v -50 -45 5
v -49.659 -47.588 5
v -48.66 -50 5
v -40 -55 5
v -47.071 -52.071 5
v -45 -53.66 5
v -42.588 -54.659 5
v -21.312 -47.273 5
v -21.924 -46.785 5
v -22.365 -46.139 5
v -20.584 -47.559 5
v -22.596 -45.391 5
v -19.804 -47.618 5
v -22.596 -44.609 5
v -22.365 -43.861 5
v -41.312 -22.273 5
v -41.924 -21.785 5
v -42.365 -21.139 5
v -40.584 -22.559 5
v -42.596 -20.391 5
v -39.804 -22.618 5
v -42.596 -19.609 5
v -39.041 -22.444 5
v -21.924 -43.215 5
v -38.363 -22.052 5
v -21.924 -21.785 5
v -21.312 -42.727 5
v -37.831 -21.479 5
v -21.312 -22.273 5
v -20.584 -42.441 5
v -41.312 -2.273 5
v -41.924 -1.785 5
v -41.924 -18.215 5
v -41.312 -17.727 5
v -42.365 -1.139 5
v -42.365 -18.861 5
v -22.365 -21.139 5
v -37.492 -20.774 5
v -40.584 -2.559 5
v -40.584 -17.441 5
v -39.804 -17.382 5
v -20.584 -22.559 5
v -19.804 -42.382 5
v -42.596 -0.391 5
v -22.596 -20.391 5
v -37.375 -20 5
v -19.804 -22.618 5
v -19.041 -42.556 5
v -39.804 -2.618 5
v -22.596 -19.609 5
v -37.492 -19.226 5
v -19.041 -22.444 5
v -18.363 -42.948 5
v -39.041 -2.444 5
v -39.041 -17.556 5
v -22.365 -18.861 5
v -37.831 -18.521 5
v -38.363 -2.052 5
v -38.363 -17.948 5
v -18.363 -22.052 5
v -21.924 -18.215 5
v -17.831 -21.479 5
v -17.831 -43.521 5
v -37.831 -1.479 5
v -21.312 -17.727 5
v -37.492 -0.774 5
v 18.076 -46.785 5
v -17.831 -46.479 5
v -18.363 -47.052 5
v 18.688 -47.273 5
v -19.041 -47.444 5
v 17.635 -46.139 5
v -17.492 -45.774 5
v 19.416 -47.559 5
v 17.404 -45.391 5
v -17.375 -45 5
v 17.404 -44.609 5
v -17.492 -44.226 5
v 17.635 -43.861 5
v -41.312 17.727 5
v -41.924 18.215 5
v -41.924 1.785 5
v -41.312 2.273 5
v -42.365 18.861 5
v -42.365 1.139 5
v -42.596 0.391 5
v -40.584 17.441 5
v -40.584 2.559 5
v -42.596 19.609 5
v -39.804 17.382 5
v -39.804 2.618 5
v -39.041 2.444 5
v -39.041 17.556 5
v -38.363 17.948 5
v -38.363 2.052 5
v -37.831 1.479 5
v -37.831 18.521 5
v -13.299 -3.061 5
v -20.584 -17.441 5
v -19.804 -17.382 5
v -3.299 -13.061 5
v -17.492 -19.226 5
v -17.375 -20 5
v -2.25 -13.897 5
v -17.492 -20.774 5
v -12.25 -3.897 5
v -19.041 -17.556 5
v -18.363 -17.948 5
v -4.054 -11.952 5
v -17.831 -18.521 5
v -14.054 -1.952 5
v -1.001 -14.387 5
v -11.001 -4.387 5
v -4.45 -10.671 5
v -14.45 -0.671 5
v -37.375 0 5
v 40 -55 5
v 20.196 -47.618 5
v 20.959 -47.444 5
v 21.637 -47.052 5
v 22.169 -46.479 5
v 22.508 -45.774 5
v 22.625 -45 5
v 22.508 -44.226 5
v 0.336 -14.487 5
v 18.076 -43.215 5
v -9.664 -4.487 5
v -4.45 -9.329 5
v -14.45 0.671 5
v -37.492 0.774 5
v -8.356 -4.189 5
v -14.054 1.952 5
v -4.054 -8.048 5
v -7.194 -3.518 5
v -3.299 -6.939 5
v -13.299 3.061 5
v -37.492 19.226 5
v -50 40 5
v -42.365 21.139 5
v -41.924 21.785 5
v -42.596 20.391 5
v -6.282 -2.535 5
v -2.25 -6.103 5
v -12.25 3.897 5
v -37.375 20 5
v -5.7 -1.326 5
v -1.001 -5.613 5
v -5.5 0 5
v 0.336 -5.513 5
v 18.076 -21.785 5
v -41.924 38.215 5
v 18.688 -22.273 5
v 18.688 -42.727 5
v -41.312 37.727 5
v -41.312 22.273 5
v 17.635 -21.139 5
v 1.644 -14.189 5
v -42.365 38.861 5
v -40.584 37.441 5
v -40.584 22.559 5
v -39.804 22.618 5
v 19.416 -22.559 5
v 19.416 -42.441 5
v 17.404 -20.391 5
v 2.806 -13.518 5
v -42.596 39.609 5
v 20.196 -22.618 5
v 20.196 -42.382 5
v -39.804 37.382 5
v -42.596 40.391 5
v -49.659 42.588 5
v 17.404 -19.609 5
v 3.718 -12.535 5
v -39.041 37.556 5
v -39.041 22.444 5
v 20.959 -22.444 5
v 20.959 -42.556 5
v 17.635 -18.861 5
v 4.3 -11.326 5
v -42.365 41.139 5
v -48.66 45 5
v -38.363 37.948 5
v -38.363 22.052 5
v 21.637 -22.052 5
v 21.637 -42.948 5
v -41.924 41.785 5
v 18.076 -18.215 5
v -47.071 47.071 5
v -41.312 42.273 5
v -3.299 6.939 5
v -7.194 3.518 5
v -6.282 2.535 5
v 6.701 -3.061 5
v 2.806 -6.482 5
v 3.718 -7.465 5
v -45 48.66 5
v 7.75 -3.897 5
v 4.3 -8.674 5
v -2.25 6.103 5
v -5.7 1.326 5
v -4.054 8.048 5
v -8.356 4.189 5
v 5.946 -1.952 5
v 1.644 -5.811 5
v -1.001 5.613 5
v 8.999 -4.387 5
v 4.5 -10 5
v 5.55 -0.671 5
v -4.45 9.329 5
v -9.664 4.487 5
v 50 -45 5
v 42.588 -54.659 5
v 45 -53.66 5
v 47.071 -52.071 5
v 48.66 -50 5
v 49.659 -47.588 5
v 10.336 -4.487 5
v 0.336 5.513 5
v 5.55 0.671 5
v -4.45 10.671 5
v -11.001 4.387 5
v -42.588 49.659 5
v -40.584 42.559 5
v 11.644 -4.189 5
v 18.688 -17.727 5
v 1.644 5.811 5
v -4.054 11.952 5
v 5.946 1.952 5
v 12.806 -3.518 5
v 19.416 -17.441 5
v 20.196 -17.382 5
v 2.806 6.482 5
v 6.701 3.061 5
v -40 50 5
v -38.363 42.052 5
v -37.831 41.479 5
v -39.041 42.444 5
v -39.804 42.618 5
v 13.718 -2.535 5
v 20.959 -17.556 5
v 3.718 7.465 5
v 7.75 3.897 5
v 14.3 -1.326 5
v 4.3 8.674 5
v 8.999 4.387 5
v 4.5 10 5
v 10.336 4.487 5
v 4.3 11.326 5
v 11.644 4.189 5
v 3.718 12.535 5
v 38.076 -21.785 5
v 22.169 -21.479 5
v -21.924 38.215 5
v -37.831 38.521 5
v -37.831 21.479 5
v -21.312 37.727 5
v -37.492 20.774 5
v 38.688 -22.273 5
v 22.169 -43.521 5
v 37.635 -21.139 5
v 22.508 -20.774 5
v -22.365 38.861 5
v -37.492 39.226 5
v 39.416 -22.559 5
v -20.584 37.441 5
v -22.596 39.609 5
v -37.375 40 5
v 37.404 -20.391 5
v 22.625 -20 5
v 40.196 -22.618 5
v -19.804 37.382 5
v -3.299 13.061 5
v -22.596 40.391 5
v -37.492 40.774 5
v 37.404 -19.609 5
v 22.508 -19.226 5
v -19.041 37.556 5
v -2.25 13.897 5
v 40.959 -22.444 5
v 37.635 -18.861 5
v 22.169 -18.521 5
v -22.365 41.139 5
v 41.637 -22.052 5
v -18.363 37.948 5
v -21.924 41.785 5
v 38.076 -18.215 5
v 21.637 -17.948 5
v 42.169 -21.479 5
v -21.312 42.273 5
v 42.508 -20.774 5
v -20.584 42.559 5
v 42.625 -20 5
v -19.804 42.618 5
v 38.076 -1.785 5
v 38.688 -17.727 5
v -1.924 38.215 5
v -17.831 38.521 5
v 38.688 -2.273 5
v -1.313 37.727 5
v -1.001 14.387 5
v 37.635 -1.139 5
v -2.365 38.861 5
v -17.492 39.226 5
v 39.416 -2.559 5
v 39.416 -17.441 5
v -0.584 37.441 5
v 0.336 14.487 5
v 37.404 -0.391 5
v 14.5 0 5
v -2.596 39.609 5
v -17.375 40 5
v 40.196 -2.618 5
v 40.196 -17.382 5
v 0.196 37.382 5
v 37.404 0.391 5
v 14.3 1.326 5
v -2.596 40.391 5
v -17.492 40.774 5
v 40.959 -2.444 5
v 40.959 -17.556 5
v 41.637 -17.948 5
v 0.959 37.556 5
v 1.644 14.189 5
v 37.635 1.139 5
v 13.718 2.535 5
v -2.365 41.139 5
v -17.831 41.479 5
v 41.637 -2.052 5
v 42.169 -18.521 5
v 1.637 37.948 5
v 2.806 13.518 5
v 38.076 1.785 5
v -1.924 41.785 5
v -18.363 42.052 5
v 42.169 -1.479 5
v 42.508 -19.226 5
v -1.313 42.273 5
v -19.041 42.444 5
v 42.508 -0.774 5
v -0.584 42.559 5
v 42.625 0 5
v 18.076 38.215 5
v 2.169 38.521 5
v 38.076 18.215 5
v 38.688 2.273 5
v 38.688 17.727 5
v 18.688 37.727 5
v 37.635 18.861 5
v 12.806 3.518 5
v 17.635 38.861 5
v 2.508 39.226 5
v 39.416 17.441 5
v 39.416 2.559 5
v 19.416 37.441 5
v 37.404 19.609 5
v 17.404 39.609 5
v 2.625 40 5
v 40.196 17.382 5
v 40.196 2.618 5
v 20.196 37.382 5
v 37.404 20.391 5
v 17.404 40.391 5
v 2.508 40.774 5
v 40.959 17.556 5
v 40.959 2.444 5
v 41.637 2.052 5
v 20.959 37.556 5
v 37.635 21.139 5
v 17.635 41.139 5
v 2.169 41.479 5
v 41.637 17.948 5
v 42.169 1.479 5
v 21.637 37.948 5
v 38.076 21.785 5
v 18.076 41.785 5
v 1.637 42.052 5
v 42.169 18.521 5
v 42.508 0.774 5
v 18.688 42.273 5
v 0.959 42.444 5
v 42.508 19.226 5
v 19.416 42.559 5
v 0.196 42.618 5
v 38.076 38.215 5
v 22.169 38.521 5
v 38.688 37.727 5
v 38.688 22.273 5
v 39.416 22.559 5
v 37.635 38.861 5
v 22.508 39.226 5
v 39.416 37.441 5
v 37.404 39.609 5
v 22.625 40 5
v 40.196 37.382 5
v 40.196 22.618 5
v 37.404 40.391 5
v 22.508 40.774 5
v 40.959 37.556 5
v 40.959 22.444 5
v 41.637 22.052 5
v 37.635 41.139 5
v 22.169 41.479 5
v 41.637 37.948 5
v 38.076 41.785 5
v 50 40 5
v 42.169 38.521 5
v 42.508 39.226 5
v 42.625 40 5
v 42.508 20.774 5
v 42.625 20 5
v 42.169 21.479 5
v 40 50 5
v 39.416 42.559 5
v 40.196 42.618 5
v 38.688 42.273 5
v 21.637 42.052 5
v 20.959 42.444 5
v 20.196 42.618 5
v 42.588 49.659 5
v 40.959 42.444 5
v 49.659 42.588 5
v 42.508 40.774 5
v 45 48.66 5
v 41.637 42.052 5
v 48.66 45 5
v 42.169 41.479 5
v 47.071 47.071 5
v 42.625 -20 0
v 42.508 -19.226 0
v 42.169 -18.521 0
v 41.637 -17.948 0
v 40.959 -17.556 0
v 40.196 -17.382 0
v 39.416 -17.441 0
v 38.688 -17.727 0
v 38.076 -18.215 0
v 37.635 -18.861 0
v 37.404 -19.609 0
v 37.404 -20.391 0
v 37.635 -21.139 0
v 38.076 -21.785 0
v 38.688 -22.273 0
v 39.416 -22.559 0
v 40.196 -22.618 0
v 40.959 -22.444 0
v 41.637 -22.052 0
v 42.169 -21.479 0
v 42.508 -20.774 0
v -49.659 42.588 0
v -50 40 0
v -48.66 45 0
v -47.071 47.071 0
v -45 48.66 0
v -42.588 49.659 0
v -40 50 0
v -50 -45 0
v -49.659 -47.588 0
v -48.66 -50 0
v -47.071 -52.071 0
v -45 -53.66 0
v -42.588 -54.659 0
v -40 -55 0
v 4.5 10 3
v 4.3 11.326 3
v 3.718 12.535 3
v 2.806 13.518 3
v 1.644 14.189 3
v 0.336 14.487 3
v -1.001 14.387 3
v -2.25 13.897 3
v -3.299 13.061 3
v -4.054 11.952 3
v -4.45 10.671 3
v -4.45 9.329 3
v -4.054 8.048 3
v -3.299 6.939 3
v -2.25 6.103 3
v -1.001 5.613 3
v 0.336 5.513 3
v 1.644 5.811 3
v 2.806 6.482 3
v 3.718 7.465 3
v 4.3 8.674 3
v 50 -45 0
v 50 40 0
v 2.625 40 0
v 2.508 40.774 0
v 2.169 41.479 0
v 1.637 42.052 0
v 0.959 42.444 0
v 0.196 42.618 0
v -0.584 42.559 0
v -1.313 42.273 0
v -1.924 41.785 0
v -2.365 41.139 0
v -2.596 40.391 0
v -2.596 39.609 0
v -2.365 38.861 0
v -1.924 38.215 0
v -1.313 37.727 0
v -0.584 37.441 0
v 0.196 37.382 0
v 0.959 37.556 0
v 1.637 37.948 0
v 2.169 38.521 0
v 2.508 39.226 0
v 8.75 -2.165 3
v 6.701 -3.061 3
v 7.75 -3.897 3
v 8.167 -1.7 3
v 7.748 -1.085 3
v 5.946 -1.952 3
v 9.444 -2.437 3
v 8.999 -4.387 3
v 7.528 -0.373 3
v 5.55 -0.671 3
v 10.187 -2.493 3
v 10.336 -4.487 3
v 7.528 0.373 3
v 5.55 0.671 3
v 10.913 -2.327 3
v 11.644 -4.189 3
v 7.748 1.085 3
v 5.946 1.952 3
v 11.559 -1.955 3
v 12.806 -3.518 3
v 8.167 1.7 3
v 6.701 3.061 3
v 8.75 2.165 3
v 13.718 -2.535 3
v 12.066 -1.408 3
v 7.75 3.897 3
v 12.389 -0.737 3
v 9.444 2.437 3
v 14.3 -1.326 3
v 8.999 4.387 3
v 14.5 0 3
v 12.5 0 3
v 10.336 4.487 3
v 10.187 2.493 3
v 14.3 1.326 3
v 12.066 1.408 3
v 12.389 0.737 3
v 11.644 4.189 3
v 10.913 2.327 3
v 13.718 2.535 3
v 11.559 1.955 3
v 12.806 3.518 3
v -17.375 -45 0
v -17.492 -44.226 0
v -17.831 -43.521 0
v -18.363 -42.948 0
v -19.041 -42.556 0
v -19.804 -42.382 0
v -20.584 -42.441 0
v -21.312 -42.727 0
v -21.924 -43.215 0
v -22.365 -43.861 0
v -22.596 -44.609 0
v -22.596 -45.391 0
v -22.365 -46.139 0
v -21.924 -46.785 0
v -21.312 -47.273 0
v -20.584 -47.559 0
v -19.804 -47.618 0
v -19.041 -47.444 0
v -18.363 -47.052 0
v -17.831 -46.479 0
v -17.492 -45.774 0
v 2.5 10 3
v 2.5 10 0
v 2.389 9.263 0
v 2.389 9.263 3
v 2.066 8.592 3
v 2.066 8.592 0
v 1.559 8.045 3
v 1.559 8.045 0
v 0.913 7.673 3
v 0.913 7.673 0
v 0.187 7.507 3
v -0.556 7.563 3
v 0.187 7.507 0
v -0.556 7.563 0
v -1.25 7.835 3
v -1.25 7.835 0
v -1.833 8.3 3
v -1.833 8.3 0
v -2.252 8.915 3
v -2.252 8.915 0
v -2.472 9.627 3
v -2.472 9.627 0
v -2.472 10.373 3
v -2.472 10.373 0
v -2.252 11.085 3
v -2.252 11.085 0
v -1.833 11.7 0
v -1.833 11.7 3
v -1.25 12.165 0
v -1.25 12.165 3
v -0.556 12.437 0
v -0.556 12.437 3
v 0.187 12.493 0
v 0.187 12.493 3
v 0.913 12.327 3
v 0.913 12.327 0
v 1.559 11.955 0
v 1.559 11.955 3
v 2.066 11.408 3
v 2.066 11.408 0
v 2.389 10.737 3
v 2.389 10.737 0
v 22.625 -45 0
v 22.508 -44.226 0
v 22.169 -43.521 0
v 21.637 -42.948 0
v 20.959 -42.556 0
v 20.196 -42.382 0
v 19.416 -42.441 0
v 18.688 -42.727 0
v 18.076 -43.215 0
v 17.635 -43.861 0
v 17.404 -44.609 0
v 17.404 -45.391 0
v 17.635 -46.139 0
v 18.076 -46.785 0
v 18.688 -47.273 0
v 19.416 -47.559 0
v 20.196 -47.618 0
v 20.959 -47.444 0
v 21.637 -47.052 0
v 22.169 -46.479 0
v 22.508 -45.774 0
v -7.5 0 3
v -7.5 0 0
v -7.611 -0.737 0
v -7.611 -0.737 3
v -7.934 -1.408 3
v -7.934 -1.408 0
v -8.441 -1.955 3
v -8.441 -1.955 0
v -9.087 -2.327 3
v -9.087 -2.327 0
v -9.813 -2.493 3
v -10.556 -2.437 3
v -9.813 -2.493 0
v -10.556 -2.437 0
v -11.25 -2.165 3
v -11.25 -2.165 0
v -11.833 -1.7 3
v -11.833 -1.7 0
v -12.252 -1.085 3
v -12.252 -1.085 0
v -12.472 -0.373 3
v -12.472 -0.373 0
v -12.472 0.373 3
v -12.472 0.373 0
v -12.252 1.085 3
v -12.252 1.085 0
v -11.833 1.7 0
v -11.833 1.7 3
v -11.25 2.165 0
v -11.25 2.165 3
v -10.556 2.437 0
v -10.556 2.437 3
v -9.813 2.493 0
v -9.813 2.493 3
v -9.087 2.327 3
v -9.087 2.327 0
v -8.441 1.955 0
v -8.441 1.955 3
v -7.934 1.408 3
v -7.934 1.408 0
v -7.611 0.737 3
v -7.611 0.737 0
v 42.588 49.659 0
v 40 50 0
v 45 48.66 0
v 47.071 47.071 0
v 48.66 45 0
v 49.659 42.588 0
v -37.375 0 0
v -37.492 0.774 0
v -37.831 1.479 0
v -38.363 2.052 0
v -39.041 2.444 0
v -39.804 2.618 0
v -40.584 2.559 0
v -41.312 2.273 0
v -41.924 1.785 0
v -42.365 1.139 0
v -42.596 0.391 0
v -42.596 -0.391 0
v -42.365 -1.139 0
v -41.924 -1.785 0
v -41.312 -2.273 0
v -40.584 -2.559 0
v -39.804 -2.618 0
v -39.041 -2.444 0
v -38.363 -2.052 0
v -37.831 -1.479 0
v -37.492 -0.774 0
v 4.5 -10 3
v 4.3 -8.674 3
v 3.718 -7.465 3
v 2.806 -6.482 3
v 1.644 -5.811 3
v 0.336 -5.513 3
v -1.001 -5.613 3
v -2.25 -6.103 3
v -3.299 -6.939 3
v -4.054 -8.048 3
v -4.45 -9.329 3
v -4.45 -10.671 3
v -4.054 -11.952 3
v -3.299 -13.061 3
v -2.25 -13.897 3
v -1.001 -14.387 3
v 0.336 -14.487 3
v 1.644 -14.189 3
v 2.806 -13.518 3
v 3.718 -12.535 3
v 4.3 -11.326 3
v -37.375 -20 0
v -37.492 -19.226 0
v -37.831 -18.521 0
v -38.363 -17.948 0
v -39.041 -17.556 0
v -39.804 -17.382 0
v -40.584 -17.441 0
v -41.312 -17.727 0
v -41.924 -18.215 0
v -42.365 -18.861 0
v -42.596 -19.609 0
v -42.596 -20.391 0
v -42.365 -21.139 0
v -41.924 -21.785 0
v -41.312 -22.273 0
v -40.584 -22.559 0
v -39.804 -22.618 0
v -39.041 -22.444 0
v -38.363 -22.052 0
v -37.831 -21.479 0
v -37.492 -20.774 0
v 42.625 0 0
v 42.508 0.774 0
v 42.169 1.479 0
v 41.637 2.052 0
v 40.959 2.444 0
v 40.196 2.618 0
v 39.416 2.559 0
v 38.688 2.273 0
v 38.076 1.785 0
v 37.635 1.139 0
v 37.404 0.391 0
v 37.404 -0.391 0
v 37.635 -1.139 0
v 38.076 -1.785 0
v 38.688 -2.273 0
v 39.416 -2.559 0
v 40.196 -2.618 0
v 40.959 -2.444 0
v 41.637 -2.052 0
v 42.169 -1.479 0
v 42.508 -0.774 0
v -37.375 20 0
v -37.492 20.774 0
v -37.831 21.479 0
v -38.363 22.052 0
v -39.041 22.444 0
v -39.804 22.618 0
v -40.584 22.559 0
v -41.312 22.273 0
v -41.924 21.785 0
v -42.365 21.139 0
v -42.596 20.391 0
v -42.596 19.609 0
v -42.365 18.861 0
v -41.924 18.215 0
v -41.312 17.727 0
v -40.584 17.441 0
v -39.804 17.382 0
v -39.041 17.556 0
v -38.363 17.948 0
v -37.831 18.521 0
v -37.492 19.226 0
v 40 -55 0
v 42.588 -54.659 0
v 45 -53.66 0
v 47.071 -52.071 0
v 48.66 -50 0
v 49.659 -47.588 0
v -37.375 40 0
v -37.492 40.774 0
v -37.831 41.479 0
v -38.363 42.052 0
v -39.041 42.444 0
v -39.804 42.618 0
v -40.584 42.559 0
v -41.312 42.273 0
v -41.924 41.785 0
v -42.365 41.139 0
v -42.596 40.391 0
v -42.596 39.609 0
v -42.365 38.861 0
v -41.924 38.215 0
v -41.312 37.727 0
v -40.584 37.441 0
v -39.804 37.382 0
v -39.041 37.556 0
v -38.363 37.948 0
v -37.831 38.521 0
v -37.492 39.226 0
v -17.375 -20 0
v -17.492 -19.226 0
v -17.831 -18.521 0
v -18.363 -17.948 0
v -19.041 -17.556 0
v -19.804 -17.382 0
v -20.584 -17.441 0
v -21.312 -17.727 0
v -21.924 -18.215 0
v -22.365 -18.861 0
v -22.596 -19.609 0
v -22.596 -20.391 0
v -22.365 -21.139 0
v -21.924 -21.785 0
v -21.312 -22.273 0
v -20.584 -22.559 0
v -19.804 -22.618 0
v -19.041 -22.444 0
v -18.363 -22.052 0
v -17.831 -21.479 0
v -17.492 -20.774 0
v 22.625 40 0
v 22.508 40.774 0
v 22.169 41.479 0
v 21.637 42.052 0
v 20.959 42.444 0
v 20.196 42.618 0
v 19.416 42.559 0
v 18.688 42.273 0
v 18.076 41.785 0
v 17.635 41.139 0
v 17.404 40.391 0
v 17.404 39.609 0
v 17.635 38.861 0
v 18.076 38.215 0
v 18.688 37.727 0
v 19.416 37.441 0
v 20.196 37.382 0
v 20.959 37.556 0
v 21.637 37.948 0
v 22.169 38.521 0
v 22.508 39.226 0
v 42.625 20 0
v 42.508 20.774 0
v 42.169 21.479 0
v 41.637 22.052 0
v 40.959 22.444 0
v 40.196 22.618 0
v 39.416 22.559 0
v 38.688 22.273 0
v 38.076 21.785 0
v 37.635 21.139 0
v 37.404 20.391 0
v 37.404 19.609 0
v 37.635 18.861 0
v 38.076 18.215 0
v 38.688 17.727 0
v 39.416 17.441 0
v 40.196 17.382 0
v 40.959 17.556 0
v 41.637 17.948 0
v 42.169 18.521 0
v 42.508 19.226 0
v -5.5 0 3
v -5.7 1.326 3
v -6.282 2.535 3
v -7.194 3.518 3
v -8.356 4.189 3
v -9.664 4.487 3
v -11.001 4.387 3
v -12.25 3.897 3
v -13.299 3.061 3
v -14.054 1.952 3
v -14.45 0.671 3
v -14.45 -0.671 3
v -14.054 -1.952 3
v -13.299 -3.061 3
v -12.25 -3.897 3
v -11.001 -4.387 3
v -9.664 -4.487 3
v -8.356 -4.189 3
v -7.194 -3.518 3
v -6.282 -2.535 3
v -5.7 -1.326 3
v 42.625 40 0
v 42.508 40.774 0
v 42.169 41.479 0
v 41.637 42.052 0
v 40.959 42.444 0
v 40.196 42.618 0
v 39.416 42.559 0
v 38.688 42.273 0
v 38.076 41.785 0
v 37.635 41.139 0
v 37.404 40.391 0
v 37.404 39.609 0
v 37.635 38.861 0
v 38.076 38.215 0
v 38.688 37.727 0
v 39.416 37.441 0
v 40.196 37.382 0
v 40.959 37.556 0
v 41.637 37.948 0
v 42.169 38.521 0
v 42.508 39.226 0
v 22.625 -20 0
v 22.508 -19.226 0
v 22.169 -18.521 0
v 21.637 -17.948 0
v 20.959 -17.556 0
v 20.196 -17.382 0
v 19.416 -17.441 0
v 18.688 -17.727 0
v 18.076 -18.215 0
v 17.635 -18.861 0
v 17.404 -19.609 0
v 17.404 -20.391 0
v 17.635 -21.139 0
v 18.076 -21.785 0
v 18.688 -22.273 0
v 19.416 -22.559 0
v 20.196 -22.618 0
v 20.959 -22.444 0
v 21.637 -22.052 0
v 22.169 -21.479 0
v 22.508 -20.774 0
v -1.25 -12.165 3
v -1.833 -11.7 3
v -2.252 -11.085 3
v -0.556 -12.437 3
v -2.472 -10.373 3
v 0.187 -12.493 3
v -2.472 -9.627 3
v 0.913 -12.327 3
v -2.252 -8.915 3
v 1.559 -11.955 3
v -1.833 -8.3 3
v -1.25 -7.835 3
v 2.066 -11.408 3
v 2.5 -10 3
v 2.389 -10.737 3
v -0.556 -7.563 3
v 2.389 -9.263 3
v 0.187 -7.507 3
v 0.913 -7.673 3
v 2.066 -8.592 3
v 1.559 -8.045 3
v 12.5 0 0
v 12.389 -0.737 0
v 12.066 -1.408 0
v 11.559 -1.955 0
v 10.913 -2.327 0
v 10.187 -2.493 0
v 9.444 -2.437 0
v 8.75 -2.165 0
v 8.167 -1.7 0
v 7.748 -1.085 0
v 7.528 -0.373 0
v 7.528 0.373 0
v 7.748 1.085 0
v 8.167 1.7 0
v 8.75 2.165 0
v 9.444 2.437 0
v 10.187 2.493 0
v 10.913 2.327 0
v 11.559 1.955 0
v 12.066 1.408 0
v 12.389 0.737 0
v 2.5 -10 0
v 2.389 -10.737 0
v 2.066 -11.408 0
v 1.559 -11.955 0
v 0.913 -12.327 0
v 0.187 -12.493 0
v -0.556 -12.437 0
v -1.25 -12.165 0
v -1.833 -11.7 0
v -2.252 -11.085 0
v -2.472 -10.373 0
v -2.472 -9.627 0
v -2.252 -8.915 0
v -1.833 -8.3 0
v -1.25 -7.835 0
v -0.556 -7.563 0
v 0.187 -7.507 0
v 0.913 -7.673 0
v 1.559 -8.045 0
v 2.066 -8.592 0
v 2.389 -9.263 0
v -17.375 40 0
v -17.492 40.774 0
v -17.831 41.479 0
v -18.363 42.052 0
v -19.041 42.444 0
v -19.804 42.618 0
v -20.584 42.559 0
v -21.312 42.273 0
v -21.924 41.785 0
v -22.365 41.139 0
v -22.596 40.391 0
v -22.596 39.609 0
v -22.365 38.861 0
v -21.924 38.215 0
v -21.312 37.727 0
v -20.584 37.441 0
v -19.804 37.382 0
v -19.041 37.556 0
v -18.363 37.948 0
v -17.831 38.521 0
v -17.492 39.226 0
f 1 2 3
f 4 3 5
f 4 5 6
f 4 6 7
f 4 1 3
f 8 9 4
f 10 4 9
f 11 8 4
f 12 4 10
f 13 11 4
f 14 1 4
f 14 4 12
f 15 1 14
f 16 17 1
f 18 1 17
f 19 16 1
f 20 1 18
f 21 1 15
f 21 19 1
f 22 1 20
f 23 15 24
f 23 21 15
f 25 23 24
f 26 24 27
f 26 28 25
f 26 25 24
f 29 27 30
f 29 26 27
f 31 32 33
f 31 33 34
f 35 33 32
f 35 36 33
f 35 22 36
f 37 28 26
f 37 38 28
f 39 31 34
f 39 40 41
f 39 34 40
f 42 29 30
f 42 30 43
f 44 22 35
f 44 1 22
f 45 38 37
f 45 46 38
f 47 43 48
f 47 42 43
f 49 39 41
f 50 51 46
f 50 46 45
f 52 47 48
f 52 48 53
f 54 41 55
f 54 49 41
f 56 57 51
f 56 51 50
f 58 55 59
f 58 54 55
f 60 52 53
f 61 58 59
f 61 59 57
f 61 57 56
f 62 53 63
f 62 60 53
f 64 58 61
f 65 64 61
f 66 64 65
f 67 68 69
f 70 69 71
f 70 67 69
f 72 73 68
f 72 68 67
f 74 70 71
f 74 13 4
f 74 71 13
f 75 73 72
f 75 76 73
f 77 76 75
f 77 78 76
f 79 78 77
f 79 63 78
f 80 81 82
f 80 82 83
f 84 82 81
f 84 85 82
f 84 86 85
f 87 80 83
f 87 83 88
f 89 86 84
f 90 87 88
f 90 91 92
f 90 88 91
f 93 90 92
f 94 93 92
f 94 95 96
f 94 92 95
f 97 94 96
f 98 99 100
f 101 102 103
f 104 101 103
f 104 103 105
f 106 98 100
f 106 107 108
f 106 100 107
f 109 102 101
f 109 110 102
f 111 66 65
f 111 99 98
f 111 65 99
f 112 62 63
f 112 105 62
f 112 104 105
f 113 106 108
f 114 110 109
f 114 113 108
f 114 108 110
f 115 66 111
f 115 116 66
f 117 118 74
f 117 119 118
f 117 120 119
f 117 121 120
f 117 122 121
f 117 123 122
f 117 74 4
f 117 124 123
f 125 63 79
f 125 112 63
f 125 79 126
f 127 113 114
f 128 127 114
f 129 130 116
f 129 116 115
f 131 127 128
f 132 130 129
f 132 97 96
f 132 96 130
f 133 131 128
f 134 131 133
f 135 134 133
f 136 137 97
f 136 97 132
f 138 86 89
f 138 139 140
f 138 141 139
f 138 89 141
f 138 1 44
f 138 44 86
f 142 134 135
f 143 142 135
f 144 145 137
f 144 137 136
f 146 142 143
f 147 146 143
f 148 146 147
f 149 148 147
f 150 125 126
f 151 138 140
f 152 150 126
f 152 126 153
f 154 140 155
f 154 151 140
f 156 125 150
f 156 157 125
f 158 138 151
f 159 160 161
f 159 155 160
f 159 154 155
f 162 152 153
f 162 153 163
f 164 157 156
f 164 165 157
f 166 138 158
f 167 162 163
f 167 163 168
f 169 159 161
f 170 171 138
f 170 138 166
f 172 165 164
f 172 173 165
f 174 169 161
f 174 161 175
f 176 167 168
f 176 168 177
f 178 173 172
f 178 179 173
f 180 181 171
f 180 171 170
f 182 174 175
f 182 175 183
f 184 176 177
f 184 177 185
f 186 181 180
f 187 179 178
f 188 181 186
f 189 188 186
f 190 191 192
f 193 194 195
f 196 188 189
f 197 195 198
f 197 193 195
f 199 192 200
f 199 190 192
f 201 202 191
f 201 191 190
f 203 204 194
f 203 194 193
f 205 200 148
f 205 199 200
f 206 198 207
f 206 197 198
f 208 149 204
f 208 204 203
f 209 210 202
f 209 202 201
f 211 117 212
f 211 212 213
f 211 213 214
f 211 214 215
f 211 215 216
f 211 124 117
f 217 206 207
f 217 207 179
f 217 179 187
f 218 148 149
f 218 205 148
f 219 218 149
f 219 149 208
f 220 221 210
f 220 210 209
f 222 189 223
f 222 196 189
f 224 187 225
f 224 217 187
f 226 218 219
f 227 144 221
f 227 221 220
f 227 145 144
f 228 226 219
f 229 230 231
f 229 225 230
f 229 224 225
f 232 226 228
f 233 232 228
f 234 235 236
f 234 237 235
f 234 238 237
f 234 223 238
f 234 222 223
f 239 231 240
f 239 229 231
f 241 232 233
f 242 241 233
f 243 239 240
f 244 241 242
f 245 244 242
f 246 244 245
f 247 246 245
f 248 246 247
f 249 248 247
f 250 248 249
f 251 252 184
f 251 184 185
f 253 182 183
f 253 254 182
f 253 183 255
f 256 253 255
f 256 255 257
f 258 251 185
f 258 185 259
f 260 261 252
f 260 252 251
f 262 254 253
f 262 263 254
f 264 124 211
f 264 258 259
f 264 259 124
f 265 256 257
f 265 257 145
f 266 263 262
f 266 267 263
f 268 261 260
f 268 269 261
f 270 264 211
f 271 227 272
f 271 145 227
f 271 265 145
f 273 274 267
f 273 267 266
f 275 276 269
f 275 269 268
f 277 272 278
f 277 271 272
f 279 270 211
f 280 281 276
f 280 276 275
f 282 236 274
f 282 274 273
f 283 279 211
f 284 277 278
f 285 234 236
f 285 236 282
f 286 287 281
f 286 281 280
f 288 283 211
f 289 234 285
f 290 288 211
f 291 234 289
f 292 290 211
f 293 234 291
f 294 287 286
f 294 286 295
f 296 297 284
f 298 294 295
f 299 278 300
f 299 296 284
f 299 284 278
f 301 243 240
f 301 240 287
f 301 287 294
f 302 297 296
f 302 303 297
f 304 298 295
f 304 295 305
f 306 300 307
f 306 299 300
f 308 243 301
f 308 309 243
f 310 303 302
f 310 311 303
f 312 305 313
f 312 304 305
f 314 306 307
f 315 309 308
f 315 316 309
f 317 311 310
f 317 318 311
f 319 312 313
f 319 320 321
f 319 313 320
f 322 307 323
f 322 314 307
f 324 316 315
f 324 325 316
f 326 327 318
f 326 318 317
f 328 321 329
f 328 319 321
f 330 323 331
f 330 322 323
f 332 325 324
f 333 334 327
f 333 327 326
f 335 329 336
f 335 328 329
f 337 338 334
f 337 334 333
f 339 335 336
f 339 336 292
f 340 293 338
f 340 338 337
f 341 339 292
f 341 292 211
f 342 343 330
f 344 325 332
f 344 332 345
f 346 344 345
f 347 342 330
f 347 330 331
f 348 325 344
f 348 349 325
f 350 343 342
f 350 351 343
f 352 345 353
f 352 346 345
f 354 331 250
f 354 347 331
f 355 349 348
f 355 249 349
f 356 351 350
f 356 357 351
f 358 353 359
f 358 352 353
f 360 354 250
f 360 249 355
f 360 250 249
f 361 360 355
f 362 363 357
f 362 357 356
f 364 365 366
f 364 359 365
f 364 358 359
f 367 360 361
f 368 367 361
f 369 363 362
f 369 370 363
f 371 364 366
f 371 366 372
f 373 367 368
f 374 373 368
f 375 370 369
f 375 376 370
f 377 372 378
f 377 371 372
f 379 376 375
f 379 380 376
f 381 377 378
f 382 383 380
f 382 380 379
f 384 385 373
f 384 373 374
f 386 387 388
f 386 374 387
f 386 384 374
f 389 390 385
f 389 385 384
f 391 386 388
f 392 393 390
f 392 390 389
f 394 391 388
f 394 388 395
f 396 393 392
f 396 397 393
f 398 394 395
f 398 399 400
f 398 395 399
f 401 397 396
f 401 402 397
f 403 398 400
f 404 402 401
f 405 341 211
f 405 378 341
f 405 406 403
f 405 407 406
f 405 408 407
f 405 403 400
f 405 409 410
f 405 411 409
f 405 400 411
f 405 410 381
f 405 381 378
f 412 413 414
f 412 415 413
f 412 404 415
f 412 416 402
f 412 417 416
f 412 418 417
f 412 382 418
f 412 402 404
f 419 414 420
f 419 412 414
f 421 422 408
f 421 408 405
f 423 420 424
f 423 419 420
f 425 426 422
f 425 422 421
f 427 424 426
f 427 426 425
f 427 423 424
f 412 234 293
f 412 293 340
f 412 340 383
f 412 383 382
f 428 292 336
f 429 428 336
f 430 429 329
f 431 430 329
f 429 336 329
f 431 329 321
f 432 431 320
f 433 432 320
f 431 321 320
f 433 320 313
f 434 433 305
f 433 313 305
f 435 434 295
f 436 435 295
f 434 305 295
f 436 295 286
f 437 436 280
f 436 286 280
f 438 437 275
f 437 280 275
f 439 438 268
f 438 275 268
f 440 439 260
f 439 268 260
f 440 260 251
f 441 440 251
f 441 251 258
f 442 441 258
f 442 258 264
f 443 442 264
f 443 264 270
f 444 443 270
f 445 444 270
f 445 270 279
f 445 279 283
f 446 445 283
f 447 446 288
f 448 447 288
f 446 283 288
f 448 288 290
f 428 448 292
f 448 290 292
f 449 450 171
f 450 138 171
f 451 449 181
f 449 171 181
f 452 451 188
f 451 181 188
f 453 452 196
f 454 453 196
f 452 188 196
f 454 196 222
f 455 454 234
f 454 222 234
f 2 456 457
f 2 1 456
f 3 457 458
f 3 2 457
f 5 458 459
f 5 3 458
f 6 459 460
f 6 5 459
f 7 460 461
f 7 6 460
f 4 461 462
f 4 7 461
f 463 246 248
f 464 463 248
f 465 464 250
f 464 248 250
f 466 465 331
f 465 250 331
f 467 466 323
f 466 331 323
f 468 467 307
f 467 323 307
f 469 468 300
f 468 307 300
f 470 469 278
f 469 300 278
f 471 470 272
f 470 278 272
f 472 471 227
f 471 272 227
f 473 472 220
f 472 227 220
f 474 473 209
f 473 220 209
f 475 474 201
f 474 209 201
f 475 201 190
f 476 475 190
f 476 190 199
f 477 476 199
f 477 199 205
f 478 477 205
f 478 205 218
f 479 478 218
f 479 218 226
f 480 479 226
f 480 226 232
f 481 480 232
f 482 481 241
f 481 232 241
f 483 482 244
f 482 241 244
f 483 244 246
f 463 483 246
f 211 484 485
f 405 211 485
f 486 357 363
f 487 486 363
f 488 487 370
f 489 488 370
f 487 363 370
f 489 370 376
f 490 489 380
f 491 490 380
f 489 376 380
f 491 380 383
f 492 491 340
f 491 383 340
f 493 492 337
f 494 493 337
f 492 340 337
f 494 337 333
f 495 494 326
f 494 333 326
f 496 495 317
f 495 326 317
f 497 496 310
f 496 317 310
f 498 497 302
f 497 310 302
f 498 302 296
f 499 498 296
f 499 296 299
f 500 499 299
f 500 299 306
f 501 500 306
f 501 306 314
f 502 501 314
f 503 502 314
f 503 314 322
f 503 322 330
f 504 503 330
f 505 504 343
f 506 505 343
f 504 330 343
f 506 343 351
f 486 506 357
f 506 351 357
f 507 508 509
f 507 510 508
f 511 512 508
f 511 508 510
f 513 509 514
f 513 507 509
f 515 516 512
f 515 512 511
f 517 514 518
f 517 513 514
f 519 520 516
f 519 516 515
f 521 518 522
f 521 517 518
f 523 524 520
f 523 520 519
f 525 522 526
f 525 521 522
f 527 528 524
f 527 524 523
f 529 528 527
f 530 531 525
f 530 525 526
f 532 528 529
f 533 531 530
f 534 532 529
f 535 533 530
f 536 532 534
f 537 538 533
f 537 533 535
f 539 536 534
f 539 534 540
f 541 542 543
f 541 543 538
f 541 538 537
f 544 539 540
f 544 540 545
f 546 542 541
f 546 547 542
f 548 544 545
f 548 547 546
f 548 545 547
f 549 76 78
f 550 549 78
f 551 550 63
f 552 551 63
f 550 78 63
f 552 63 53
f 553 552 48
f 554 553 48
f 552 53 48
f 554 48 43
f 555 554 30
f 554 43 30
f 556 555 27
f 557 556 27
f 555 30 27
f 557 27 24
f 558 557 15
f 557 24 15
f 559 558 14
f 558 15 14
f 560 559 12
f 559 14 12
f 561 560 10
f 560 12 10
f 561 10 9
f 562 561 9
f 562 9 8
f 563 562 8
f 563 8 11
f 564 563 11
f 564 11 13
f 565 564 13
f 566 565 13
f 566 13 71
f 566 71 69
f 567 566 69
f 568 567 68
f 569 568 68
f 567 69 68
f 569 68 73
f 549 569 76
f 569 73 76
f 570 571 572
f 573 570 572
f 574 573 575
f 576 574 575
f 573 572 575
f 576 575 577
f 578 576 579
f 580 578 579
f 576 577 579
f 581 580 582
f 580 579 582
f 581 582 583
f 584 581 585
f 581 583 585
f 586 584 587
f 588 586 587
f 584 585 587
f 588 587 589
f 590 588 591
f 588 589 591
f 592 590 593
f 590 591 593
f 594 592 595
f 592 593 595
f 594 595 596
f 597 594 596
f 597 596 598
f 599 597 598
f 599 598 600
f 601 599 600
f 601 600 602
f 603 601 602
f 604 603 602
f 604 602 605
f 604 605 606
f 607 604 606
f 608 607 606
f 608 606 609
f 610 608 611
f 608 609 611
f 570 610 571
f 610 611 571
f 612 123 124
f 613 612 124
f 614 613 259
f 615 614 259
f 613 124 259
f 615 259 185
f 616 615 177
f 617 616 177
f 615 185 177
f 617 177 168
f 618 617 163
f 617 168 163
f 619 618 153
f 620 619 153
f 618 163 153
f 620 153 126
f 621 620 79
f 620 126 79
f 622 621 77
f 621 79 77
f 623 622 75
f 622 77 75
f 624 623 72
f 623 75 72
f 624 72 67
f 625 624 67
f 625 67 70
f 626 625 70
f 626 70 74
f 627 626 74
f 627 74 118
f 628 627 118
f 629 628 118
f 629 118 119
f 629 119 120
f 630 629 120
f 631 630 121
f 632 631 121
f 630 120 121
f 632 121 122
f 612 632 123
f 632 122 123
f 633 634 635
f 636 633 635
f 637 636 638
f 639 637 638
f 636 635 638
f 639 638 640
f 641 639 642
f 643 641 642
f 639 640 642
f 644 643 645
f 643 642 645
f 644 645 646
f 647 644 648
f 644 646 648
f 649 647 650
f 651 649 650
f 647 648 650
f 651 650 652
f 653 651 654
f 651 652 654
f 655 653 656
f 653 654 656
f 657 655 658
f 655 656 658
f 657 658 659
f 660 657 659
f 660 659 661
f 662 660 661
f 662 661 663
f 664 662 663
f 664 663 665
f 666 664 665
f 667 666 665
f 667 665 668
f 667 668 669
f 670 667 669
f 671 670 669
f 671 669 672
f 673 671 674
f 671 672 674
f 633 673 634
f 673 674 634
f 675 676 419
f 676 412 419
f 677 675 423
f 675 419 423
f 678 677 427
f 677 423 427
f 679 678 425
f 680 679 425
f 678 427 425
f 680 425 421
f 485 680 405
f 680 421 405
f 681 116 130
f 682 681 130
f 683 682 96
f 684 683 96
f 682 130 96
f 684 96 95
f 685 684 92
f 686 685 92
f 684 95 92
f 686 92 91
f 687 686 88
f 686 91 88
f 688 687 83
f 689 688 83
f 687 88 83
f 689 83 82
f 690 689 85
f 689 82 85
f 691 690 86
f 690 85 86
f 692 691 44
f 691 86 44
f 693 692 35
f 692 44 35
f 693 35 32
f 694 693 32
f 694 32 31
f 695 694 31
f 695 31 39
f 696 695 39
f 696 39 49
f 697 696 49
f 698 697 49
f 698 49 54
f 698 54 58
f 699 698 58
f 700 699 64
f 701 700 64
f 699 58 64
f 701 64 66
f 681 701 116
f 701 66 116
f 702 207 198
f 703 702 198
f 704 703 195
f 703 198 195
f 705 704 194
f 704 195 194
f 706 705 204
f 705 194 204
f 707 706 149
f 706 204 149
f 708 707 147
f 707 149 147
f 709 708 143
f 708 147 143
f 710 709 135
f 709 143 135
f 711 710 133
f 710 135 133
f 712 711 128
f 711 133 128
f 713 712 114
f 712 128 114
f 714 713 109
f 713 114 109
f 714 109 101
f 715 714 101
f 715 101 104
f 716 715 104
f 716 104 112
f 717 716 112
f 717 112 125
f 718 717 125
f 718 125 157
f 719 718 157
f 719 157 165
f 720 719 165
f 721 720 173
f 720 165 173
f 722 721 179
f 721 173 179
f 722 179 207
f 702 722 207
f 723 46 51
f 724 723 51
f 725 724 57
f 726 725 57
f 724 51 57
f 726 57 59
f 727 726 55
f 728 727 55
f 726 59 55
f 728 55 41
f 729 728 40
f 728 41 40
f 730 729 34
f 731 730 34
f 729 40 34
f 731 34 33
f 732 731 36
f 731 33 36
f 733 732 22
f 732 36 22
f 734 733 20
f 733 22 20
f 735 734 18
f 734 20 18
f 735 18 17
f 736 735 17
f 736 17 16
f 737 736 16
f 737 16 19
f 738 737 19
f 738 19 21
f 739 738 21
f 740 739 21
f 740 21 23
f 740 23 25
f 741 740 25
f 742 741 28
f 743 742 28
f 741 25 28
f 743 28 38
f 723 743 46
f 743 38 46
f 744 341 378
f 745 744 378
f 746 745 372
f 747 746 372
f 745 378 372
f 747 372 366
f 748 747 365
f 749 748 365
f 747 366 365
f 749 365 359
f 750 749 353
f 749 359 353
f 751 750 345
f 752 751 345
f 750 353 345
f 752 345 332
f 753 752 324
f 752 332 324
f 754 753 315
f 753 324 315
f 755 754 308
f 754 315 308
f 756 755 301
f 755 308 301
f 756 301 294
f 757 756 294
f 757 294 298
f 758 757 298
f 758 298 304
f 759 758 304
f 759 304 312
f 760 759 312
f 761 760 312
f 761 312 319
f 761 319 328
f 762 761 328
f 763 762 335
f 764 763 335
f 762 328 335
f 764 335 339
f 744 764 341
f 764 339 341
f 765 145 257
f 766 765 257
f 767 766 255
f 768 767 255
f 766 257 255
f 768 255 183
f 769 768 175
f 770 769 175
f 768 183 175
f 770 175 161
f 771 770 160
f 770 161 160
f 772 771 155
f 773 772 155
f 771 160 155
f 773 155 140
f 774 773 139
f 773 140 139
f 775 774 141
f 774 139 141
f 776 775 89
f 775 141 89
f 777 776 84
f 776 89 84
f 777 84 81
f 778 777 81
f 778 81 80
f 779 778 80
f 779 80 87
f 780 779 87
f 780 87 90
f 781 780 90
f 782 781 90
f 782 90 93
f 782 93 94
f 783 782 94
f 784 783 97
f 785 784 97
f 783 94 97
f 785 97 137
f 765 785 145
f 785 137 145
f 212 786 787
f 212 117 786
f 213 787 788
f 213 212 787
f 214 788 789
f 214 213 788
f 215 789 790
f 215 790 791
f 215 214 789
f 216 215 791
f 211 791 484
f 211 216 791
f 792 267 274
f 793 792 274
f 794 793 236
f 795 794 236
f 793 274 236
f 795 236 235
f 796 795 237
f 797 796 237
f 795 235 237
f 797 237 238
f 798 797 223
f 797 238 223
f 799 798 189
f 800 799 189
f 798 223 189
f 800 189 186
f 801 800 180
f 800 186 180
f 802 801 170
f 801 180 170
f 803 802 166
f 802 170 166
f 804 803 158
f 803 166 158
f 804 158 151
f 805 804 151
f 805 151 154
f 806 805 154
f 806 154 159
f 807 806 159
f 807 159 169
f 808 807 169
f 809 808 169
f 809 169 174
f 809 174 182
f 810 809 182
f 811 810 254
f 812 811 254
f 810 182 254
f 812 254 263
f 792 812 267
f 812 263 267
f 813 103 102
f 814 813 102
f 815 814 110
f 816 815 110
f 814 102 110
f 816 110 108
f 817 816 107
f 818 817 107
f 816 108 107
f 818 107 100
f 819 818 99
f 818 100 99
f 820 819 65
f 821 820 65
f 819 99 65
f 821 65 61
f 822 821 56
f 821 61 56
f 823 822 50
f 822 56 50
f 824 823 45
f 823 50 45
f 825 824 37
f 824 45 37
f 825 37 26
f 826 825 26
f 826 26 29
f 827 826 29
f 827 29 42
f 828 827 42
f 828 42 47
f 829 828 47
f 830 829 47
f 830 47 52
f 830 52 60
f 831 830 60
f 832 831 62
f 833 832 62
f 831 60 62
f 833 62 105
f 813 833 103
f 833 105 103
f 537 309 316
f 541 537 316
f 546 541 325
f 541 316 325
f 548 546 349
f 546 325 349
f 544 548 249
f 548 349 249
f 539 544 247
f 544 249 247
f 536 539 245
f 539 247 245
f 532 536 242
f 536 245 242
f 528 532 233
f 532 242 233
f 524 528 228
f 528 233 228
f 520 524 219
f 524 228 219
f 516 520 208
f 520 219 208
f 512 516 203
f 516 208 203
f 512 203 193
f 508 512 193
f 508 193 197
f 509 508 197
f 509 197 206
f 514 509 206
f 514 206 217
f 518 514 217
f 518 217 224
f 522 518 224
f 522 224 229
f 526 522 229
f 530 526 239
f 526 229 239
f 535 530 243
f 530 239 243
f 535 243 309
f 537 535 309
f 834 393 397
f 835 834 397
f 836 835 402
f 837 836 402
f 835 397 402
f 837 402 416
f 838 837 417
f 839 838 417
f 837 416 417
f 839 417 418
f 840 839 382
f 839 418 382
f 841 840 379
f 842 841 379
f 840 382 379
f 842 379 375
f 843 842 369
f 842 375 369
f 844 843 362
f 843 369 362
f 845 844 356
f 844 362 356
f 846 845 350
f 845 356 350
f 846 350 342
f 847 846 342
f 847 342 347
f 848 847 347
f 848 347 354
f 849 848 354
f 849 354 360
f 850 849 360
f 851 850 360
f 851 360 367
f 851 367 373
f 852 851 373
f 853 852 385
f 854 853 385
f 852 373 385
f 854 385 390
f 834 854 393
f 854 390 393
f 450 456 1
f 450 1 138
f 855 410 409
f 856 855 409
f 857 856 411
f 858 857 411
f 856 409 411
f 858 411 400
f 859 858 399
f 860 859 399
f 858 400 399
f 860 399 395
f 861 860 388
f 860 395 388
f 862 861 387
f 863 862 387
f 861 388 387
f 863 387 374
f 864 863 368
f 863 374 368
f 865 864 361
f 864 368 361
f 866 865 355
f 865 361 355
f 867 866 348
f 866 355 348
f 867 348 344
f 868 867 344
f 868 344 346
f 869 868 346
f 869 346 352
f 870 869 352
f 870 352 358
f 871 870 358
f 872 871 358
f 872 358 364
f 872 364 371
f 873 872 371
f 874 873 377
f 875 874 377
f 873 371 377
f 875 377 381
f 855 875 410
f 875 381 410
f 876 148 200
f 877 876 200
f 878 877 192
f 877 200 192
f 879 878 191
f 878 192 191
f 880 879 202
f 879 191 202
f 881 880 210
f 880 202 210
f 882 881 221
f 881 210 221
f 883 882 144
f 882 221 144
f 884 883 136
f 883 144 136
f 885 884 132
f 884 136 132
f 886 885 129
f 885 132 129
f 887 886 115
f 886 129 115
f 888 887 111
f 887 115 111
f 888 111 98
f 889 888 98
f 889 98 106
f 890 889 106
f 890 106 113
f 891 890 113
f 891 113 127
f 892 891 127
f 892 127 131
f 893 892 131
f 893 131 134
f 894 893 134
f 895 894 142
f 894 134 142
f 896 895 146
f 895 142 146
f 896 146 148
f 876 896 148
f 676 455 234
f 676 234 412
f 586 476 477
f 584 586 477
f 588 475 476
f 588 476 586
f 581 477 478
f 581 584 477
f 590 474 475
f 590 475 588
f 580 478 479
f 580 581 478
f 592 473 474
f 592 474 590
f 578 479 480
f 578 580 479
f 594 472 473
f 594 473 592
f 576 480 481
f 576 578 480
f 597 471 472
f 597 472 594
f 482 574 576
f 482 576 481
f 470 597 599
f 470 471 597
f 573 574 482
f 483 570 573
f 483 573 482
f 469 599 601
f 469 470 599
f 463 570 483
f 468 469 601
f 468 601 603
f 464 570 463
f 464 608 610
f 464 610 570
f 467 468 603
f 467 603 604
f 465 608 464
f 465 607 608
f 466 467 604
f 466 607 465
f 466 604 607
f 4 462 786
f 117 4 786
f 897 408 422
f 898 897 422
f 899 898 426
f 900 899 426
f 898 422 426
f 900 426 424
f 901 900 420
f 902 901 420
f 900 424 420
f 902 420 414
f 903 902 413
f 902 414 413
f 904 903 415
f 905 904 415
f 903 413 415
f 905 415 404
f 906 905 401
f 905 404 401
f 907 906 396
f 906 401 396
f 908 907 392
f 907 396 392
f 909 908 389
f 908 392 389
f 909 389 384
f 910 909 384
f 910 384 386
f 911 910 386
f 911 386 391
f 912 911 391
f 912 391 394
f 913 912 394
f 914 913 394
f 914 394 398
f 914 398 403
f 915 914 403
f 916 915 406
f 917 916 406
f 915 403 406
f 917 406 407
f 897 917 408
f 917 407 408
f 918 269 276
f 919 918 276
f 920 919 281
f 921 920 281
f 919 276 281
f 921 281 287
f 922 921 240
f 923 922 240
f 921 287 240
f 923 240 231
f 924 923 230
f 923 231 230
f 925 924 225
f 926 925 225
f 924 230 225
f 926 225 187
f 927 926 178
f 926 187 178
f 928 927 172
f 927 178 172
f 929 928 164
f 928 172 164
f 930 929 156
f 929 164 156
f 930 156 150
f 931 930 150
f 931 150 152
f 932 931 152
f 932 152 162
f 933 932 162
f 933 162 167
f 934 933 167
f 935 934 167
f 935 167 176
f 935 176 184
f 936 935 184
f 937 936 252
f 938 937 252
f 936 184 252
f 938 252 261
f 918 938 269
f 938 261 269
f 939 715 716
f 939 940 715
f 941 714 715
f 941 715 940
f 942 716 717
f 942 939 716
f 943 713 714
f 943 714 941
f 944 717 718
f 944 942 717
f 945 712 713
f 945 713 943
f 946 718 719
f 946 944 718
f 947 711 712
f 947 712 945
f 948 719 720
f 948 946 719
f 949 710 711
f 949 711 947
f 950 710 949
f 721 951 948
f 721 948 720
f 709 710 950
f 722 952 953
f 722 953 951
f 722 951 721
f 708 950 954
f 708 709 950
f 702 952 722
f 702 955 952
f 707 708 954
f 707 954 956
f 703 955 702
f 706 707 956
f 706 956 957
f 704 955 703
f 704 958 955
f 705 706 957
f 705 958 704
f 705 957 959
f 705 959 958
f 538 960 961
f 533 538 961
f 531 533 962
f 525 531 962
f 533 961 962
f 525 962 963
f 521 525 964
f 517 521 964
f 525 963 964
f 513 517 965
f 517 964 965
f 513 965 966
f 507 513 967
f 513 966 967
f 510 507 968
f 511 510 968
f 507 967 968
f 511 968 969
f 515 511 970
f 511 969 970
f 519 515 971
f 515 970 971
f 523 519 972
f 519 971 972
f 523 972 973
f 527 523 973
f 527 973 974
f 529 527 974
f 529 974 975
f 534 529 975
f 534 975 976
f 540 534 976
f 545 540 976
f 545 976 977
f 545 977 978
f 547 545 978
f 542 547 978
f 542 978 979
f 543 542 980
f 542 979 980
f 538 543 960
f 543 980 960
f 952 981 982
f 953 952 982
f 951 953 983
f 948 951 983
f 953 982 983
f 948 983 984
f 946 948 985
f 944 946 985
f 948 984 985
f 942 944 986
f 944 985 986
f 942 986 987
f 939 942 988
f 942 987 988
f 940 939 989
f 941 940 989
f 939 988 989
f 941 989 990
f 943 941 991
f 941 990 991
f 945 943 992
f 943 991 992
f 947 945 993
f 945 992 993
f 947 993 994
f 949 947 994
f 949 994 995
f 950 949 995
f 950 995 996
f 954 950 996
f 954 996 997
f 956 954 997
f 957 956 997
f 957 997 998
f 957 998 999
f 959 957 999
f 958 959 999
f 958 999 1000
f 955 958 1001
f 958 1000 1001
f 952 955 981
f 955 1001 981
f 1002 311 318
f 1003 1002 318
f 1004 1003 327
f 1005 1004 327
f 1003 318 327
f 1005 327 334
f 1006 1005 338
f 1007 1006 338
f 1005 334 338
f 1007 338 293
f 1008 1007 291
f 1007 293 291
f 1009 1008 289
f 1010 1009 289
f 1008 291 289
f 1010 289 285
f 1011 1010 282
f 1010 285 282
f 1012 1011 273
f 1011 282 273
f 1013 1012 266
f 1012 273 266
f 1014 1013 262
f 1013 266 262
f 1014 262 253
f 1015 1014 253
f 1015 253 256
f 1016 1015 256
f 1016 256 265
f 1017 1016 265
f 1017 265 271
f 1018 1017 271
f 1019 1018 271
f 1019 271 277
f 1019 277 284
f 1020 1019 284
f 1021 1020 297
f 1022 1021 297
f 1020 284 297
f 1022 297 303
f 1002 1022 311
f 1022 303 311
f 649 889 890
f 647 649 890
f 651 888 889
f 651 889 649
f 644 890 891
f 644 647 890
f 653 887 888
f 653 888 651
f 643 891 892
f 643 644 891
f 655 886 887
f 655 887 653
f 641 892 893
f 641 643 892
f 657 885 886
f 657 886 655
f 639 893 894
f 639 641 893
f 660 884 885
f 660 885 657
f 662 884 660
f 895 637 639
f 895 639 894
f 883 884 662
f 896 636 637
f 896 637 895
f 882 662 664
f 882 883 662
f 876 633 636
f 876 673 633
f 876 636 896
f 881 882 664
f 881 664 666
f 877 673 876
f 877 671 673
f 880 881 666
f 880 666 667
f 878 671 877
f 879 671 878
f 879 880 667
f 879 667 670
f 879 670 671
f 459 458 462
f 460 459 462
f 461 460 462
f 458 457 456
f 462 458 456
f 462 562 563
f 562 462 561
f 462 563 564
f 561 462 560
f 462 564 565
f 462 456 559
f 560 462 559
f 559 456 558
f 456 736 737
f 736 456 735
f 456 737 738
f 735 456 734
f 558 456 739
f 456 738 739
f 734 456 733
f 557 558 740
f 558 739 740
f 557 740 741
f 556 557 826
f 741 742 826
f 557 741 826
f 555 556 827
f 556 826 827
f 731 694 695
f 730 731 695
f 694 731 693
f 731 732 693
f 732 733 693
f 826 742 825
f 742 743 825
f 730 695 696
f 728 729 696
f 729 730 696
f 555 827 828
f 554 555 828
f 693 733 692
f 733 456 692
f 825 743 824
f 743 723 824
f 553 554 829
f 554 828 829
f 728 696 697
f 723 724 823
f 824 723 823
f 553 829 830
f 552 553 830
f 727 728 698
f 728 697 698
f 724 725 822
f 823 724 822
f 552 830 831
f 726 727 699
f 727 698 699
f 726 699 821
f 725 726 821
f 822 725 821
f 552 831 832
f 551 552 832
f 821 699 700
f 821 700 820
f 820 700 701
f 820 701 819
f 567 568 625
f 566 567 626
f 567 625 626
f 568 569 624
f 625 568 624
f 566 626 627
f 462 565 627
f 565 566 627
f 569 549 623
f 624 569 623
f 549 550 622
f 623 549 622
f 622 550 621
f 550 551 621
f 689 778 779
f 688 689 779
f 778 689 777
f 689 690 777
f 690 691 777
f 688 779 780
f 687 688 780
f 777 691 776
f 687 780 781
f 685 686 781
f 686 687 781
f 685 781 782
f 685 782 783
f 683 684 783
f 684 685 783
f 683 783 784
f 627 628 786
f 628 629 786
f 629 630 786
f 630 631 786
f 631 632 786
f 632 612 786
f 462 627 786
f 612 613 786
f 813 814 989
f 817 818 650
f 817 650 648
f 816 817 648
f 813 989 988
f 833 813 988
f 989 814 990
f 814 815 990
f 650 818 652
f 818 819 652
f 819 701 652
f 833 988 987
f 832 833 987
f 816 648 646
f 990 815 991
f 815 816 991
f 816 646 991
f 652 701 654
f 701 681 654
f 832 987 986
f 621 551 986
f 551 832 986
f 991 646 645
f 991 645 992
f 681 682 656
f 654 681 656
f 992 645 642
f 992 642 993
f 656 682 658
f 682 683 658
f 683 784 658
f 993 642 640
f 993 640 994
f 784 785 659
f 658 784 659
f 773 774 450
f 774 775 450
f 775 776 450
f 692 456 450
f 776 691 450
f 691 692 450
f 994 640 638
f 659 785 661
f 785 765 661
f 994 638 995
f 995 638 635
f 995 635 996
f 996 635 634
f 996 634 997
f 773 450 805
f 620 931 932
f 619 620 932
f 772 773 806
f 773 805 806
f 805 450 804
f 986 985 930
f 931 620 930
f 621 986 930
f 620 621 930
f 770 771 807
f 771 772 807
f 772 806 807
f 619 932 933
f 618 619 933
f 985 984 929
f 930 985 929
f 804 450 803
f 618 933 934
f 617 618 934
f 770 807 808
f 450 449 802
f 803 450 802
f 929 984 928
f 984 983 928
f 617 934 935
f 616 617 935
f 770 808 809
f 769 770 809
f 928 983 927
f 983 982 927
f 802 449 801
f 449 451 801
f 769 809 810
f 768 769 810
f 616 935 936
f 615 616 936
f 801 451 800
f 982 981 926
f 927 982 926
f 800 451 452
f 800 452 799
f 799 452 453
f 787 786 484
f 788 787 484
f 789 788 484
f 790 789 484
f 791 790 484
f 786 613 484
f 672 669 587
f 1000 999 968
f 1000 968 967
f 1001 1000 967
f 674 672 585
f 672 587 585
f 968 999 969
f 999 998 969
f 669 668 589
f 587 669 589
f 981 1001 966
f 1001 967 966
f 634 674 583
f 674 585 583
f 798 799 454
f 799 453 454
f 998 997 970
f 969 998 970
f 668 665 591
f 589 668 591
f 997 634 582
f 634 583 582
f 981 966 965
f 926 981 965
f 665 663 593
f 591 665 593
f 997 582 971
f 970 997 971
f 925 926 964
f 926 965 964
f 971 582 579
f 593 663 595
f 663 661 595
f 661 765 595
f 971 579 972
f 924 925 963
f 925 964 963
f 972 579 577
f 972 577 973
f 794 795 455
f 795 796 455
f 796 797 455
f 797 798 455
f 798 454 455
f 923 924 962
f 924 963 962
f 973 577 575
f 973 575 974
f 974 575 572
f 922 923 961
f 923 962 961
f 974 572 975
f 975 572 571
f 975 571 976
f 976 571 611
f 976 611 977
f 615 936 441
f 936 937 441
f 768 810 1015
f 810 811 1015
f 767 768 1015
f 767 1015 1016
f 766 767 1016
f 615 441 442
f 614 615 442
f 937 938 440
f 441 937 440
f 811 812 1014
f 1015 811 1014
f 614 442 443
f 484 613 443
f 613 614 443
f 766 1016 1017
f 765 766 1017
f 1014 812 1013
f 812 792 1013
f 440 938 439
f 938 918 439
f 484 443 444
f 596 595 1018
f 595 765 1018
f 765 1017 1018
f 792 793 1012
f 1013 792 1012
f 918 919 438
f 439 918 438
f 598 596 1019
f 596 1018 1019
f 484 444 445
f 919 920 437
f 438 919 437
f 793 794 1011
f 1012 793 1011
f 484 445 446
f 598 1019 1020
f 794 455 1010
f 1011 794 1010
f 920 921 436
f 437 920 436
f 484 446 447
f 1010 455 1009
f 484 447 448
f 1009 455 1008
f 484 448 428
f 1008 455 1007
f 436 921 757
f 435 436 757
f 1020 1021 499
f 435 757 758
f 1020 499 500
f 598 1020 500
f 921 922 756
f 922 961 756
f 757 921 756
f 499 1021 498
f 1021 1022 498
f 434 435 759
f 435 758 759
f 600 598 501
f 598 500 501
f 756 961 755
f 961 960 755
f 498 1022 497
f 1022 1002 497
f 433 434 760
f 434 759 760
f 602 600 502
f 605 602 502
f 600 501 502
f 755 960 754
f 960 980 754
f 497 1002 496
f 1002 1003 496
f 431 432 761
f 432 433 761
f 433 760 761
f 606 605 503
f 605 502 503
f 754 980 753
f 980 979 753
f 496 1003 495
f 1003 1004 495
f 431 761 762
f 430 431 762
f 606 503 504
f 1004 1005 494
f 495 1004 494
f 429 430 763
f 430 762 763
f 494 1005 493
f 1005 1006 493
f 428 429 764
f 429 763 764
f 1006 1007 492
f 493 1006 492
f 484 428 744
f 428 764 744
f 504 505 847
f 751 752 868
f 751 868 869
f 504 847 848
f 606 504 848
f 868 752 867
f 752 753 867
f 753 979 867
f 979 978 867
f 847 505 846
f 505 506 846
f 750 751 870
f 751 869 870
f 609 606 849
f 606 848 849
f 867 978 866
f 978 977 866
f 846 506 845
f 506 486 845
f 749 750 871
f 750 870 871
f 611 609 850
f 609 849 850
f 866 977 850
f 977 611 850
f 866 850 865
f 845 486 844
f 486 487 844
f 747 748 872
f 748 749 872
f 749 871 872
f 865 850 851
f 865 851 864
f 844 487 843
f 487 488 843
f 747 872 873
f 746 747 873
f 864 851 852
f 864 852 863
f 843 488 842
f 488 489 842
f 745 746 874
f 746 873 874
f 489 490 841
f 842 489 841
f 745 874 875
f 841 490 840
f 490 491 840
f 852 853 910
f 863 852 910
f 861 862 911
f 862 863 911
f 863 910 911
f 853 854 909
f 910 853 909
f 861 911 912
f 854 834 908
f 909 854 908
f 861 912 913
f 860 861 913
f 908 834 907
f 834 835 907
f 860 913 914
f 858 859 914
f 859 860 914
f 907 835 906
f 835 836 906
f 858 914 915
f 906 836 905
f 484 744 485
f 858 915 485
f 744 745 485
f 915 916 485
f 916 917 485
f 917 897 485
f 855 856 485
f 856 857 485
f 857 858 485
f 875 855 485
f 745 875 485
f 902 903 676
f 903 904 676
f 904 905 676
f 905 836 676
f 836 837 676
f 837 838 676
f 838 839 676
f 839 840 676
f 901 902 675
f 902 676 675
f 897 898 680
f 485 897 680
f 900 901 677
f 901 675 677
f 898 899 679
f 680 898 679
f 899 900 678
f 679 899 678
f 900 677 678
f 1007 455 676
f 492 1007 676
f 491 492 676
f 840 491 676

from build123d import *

# Parameters (mm, degrees)
SKETCH_W        = 100
SKETCH_H        = 105
PAD_DEPTH       = 5
SKETCH001_R     = 4.5
POCKET_DEPTH    = 2
SKETCH002_R     = 2.5
POCKET001_DEPTH = 3
SKETCH003_R     = 2.625
POCKET002_DEPTH = 5
FILLET_R        = 10


with BuildPart() as part:
    # Sketch → Pad (new body)
    with BuildSketch(Plane.XY):
        with Locations((0, -2.5)):
            Rectangle(SKETCH_W, SKETCH_H)
    extrude(amount=PAD_DEPTH)

    # Sketch001 (on Face6 of Pad) → Pocket (cut)
    with BuildSketch(Plane.XY.offset(5)):
        with Locations((0, 10)):
            Circle(SKETCH001_R)
        with Locations((10, 0)):
            Circle(SKETCH001_R)
        with Locations((-10, 0)):
            Circle(SKETCH001_R)
        with Locations((0, -10)):
            Circle(SKETCH001_R)
    extrude(amount=-POCKET_DEPTH, mode=Mode.SUBTRACT)

    # Sketch002 (on Face4 of Pocket) → Pocket001 (cut)
    with BuildSketch(Plane(origin=(0, 0, 0), x_dir=(1, 0, 0), z_dir=(0, 0, -1))):
        with Locations((0, 10)):
            Circle(SKETCH002_R)
        with Locations((10, 0)):
            Circle(SKETCH002_R)
        with Locations((0, -10)):
            Circle(SKETCH002_R)
        with Locations((-10, 0)):
            Circle(SKETCH002_R)
    extrude(amount=-POCKET001_DEPTH, mode=Mode.SUBTRACT)

    # Sketch003 (on Face5 of Pocket001) → Pocket002 (cut)
    with BuildSketch(Plane.XY.offset(5)):
        with Locations((-40, 0)):
            Circle(SKETCH003_R)
        with Locations((-40, -20)):
            Circle(SKETCH003_R)
        with Locations((-20, -45)):
            Circle(SKETCH003_R)
        with Locations((20, -45)):
            Circle(SKETCH003_R)
        with Locations((40, -20)):
            Circle(SKETCH003_R)
        with Locations((40, 0)):
            Circle(SKETCH003_R)
        with Locations((40, 20)):
            Circle(SKETCH003_R)
        with Locations((40, 40)):
            Circle(SKETCH003_R)
        with Locations((20, 40)):
            Circle(SKETCH003_R)
        with Locations((0, 40)):
            Circle(SKETCH003_R)
        with Locations((-20, 40)):
            Circle(SKETCH003_R)
        with Locations((-40, 40)):
            Circle(SKETCH003_R)
        with Locations((-40, 20)):
            Circle(SKETCH003_R)
        with Locations((-20, -20)):
            Circle(SKETCH003_R)
        with Locations((20, -20)):
            Circle(SKETCH003_R)
    extrude(amount=-POCKET002_DEPTH, mode=Mode.SUBTRACT)

    # Fillet
    fillet_edges = [part.edges().sort_by_distance(p)[0] for p in [
        (-50, 50, 2.5),
        (50, 50, 2.5),
        (50, -55, 2.5),
        (-50, -55, 2.5),
    ]]
    fillet(fillet_edges, radius=FILLET_R)


solid = part.part
